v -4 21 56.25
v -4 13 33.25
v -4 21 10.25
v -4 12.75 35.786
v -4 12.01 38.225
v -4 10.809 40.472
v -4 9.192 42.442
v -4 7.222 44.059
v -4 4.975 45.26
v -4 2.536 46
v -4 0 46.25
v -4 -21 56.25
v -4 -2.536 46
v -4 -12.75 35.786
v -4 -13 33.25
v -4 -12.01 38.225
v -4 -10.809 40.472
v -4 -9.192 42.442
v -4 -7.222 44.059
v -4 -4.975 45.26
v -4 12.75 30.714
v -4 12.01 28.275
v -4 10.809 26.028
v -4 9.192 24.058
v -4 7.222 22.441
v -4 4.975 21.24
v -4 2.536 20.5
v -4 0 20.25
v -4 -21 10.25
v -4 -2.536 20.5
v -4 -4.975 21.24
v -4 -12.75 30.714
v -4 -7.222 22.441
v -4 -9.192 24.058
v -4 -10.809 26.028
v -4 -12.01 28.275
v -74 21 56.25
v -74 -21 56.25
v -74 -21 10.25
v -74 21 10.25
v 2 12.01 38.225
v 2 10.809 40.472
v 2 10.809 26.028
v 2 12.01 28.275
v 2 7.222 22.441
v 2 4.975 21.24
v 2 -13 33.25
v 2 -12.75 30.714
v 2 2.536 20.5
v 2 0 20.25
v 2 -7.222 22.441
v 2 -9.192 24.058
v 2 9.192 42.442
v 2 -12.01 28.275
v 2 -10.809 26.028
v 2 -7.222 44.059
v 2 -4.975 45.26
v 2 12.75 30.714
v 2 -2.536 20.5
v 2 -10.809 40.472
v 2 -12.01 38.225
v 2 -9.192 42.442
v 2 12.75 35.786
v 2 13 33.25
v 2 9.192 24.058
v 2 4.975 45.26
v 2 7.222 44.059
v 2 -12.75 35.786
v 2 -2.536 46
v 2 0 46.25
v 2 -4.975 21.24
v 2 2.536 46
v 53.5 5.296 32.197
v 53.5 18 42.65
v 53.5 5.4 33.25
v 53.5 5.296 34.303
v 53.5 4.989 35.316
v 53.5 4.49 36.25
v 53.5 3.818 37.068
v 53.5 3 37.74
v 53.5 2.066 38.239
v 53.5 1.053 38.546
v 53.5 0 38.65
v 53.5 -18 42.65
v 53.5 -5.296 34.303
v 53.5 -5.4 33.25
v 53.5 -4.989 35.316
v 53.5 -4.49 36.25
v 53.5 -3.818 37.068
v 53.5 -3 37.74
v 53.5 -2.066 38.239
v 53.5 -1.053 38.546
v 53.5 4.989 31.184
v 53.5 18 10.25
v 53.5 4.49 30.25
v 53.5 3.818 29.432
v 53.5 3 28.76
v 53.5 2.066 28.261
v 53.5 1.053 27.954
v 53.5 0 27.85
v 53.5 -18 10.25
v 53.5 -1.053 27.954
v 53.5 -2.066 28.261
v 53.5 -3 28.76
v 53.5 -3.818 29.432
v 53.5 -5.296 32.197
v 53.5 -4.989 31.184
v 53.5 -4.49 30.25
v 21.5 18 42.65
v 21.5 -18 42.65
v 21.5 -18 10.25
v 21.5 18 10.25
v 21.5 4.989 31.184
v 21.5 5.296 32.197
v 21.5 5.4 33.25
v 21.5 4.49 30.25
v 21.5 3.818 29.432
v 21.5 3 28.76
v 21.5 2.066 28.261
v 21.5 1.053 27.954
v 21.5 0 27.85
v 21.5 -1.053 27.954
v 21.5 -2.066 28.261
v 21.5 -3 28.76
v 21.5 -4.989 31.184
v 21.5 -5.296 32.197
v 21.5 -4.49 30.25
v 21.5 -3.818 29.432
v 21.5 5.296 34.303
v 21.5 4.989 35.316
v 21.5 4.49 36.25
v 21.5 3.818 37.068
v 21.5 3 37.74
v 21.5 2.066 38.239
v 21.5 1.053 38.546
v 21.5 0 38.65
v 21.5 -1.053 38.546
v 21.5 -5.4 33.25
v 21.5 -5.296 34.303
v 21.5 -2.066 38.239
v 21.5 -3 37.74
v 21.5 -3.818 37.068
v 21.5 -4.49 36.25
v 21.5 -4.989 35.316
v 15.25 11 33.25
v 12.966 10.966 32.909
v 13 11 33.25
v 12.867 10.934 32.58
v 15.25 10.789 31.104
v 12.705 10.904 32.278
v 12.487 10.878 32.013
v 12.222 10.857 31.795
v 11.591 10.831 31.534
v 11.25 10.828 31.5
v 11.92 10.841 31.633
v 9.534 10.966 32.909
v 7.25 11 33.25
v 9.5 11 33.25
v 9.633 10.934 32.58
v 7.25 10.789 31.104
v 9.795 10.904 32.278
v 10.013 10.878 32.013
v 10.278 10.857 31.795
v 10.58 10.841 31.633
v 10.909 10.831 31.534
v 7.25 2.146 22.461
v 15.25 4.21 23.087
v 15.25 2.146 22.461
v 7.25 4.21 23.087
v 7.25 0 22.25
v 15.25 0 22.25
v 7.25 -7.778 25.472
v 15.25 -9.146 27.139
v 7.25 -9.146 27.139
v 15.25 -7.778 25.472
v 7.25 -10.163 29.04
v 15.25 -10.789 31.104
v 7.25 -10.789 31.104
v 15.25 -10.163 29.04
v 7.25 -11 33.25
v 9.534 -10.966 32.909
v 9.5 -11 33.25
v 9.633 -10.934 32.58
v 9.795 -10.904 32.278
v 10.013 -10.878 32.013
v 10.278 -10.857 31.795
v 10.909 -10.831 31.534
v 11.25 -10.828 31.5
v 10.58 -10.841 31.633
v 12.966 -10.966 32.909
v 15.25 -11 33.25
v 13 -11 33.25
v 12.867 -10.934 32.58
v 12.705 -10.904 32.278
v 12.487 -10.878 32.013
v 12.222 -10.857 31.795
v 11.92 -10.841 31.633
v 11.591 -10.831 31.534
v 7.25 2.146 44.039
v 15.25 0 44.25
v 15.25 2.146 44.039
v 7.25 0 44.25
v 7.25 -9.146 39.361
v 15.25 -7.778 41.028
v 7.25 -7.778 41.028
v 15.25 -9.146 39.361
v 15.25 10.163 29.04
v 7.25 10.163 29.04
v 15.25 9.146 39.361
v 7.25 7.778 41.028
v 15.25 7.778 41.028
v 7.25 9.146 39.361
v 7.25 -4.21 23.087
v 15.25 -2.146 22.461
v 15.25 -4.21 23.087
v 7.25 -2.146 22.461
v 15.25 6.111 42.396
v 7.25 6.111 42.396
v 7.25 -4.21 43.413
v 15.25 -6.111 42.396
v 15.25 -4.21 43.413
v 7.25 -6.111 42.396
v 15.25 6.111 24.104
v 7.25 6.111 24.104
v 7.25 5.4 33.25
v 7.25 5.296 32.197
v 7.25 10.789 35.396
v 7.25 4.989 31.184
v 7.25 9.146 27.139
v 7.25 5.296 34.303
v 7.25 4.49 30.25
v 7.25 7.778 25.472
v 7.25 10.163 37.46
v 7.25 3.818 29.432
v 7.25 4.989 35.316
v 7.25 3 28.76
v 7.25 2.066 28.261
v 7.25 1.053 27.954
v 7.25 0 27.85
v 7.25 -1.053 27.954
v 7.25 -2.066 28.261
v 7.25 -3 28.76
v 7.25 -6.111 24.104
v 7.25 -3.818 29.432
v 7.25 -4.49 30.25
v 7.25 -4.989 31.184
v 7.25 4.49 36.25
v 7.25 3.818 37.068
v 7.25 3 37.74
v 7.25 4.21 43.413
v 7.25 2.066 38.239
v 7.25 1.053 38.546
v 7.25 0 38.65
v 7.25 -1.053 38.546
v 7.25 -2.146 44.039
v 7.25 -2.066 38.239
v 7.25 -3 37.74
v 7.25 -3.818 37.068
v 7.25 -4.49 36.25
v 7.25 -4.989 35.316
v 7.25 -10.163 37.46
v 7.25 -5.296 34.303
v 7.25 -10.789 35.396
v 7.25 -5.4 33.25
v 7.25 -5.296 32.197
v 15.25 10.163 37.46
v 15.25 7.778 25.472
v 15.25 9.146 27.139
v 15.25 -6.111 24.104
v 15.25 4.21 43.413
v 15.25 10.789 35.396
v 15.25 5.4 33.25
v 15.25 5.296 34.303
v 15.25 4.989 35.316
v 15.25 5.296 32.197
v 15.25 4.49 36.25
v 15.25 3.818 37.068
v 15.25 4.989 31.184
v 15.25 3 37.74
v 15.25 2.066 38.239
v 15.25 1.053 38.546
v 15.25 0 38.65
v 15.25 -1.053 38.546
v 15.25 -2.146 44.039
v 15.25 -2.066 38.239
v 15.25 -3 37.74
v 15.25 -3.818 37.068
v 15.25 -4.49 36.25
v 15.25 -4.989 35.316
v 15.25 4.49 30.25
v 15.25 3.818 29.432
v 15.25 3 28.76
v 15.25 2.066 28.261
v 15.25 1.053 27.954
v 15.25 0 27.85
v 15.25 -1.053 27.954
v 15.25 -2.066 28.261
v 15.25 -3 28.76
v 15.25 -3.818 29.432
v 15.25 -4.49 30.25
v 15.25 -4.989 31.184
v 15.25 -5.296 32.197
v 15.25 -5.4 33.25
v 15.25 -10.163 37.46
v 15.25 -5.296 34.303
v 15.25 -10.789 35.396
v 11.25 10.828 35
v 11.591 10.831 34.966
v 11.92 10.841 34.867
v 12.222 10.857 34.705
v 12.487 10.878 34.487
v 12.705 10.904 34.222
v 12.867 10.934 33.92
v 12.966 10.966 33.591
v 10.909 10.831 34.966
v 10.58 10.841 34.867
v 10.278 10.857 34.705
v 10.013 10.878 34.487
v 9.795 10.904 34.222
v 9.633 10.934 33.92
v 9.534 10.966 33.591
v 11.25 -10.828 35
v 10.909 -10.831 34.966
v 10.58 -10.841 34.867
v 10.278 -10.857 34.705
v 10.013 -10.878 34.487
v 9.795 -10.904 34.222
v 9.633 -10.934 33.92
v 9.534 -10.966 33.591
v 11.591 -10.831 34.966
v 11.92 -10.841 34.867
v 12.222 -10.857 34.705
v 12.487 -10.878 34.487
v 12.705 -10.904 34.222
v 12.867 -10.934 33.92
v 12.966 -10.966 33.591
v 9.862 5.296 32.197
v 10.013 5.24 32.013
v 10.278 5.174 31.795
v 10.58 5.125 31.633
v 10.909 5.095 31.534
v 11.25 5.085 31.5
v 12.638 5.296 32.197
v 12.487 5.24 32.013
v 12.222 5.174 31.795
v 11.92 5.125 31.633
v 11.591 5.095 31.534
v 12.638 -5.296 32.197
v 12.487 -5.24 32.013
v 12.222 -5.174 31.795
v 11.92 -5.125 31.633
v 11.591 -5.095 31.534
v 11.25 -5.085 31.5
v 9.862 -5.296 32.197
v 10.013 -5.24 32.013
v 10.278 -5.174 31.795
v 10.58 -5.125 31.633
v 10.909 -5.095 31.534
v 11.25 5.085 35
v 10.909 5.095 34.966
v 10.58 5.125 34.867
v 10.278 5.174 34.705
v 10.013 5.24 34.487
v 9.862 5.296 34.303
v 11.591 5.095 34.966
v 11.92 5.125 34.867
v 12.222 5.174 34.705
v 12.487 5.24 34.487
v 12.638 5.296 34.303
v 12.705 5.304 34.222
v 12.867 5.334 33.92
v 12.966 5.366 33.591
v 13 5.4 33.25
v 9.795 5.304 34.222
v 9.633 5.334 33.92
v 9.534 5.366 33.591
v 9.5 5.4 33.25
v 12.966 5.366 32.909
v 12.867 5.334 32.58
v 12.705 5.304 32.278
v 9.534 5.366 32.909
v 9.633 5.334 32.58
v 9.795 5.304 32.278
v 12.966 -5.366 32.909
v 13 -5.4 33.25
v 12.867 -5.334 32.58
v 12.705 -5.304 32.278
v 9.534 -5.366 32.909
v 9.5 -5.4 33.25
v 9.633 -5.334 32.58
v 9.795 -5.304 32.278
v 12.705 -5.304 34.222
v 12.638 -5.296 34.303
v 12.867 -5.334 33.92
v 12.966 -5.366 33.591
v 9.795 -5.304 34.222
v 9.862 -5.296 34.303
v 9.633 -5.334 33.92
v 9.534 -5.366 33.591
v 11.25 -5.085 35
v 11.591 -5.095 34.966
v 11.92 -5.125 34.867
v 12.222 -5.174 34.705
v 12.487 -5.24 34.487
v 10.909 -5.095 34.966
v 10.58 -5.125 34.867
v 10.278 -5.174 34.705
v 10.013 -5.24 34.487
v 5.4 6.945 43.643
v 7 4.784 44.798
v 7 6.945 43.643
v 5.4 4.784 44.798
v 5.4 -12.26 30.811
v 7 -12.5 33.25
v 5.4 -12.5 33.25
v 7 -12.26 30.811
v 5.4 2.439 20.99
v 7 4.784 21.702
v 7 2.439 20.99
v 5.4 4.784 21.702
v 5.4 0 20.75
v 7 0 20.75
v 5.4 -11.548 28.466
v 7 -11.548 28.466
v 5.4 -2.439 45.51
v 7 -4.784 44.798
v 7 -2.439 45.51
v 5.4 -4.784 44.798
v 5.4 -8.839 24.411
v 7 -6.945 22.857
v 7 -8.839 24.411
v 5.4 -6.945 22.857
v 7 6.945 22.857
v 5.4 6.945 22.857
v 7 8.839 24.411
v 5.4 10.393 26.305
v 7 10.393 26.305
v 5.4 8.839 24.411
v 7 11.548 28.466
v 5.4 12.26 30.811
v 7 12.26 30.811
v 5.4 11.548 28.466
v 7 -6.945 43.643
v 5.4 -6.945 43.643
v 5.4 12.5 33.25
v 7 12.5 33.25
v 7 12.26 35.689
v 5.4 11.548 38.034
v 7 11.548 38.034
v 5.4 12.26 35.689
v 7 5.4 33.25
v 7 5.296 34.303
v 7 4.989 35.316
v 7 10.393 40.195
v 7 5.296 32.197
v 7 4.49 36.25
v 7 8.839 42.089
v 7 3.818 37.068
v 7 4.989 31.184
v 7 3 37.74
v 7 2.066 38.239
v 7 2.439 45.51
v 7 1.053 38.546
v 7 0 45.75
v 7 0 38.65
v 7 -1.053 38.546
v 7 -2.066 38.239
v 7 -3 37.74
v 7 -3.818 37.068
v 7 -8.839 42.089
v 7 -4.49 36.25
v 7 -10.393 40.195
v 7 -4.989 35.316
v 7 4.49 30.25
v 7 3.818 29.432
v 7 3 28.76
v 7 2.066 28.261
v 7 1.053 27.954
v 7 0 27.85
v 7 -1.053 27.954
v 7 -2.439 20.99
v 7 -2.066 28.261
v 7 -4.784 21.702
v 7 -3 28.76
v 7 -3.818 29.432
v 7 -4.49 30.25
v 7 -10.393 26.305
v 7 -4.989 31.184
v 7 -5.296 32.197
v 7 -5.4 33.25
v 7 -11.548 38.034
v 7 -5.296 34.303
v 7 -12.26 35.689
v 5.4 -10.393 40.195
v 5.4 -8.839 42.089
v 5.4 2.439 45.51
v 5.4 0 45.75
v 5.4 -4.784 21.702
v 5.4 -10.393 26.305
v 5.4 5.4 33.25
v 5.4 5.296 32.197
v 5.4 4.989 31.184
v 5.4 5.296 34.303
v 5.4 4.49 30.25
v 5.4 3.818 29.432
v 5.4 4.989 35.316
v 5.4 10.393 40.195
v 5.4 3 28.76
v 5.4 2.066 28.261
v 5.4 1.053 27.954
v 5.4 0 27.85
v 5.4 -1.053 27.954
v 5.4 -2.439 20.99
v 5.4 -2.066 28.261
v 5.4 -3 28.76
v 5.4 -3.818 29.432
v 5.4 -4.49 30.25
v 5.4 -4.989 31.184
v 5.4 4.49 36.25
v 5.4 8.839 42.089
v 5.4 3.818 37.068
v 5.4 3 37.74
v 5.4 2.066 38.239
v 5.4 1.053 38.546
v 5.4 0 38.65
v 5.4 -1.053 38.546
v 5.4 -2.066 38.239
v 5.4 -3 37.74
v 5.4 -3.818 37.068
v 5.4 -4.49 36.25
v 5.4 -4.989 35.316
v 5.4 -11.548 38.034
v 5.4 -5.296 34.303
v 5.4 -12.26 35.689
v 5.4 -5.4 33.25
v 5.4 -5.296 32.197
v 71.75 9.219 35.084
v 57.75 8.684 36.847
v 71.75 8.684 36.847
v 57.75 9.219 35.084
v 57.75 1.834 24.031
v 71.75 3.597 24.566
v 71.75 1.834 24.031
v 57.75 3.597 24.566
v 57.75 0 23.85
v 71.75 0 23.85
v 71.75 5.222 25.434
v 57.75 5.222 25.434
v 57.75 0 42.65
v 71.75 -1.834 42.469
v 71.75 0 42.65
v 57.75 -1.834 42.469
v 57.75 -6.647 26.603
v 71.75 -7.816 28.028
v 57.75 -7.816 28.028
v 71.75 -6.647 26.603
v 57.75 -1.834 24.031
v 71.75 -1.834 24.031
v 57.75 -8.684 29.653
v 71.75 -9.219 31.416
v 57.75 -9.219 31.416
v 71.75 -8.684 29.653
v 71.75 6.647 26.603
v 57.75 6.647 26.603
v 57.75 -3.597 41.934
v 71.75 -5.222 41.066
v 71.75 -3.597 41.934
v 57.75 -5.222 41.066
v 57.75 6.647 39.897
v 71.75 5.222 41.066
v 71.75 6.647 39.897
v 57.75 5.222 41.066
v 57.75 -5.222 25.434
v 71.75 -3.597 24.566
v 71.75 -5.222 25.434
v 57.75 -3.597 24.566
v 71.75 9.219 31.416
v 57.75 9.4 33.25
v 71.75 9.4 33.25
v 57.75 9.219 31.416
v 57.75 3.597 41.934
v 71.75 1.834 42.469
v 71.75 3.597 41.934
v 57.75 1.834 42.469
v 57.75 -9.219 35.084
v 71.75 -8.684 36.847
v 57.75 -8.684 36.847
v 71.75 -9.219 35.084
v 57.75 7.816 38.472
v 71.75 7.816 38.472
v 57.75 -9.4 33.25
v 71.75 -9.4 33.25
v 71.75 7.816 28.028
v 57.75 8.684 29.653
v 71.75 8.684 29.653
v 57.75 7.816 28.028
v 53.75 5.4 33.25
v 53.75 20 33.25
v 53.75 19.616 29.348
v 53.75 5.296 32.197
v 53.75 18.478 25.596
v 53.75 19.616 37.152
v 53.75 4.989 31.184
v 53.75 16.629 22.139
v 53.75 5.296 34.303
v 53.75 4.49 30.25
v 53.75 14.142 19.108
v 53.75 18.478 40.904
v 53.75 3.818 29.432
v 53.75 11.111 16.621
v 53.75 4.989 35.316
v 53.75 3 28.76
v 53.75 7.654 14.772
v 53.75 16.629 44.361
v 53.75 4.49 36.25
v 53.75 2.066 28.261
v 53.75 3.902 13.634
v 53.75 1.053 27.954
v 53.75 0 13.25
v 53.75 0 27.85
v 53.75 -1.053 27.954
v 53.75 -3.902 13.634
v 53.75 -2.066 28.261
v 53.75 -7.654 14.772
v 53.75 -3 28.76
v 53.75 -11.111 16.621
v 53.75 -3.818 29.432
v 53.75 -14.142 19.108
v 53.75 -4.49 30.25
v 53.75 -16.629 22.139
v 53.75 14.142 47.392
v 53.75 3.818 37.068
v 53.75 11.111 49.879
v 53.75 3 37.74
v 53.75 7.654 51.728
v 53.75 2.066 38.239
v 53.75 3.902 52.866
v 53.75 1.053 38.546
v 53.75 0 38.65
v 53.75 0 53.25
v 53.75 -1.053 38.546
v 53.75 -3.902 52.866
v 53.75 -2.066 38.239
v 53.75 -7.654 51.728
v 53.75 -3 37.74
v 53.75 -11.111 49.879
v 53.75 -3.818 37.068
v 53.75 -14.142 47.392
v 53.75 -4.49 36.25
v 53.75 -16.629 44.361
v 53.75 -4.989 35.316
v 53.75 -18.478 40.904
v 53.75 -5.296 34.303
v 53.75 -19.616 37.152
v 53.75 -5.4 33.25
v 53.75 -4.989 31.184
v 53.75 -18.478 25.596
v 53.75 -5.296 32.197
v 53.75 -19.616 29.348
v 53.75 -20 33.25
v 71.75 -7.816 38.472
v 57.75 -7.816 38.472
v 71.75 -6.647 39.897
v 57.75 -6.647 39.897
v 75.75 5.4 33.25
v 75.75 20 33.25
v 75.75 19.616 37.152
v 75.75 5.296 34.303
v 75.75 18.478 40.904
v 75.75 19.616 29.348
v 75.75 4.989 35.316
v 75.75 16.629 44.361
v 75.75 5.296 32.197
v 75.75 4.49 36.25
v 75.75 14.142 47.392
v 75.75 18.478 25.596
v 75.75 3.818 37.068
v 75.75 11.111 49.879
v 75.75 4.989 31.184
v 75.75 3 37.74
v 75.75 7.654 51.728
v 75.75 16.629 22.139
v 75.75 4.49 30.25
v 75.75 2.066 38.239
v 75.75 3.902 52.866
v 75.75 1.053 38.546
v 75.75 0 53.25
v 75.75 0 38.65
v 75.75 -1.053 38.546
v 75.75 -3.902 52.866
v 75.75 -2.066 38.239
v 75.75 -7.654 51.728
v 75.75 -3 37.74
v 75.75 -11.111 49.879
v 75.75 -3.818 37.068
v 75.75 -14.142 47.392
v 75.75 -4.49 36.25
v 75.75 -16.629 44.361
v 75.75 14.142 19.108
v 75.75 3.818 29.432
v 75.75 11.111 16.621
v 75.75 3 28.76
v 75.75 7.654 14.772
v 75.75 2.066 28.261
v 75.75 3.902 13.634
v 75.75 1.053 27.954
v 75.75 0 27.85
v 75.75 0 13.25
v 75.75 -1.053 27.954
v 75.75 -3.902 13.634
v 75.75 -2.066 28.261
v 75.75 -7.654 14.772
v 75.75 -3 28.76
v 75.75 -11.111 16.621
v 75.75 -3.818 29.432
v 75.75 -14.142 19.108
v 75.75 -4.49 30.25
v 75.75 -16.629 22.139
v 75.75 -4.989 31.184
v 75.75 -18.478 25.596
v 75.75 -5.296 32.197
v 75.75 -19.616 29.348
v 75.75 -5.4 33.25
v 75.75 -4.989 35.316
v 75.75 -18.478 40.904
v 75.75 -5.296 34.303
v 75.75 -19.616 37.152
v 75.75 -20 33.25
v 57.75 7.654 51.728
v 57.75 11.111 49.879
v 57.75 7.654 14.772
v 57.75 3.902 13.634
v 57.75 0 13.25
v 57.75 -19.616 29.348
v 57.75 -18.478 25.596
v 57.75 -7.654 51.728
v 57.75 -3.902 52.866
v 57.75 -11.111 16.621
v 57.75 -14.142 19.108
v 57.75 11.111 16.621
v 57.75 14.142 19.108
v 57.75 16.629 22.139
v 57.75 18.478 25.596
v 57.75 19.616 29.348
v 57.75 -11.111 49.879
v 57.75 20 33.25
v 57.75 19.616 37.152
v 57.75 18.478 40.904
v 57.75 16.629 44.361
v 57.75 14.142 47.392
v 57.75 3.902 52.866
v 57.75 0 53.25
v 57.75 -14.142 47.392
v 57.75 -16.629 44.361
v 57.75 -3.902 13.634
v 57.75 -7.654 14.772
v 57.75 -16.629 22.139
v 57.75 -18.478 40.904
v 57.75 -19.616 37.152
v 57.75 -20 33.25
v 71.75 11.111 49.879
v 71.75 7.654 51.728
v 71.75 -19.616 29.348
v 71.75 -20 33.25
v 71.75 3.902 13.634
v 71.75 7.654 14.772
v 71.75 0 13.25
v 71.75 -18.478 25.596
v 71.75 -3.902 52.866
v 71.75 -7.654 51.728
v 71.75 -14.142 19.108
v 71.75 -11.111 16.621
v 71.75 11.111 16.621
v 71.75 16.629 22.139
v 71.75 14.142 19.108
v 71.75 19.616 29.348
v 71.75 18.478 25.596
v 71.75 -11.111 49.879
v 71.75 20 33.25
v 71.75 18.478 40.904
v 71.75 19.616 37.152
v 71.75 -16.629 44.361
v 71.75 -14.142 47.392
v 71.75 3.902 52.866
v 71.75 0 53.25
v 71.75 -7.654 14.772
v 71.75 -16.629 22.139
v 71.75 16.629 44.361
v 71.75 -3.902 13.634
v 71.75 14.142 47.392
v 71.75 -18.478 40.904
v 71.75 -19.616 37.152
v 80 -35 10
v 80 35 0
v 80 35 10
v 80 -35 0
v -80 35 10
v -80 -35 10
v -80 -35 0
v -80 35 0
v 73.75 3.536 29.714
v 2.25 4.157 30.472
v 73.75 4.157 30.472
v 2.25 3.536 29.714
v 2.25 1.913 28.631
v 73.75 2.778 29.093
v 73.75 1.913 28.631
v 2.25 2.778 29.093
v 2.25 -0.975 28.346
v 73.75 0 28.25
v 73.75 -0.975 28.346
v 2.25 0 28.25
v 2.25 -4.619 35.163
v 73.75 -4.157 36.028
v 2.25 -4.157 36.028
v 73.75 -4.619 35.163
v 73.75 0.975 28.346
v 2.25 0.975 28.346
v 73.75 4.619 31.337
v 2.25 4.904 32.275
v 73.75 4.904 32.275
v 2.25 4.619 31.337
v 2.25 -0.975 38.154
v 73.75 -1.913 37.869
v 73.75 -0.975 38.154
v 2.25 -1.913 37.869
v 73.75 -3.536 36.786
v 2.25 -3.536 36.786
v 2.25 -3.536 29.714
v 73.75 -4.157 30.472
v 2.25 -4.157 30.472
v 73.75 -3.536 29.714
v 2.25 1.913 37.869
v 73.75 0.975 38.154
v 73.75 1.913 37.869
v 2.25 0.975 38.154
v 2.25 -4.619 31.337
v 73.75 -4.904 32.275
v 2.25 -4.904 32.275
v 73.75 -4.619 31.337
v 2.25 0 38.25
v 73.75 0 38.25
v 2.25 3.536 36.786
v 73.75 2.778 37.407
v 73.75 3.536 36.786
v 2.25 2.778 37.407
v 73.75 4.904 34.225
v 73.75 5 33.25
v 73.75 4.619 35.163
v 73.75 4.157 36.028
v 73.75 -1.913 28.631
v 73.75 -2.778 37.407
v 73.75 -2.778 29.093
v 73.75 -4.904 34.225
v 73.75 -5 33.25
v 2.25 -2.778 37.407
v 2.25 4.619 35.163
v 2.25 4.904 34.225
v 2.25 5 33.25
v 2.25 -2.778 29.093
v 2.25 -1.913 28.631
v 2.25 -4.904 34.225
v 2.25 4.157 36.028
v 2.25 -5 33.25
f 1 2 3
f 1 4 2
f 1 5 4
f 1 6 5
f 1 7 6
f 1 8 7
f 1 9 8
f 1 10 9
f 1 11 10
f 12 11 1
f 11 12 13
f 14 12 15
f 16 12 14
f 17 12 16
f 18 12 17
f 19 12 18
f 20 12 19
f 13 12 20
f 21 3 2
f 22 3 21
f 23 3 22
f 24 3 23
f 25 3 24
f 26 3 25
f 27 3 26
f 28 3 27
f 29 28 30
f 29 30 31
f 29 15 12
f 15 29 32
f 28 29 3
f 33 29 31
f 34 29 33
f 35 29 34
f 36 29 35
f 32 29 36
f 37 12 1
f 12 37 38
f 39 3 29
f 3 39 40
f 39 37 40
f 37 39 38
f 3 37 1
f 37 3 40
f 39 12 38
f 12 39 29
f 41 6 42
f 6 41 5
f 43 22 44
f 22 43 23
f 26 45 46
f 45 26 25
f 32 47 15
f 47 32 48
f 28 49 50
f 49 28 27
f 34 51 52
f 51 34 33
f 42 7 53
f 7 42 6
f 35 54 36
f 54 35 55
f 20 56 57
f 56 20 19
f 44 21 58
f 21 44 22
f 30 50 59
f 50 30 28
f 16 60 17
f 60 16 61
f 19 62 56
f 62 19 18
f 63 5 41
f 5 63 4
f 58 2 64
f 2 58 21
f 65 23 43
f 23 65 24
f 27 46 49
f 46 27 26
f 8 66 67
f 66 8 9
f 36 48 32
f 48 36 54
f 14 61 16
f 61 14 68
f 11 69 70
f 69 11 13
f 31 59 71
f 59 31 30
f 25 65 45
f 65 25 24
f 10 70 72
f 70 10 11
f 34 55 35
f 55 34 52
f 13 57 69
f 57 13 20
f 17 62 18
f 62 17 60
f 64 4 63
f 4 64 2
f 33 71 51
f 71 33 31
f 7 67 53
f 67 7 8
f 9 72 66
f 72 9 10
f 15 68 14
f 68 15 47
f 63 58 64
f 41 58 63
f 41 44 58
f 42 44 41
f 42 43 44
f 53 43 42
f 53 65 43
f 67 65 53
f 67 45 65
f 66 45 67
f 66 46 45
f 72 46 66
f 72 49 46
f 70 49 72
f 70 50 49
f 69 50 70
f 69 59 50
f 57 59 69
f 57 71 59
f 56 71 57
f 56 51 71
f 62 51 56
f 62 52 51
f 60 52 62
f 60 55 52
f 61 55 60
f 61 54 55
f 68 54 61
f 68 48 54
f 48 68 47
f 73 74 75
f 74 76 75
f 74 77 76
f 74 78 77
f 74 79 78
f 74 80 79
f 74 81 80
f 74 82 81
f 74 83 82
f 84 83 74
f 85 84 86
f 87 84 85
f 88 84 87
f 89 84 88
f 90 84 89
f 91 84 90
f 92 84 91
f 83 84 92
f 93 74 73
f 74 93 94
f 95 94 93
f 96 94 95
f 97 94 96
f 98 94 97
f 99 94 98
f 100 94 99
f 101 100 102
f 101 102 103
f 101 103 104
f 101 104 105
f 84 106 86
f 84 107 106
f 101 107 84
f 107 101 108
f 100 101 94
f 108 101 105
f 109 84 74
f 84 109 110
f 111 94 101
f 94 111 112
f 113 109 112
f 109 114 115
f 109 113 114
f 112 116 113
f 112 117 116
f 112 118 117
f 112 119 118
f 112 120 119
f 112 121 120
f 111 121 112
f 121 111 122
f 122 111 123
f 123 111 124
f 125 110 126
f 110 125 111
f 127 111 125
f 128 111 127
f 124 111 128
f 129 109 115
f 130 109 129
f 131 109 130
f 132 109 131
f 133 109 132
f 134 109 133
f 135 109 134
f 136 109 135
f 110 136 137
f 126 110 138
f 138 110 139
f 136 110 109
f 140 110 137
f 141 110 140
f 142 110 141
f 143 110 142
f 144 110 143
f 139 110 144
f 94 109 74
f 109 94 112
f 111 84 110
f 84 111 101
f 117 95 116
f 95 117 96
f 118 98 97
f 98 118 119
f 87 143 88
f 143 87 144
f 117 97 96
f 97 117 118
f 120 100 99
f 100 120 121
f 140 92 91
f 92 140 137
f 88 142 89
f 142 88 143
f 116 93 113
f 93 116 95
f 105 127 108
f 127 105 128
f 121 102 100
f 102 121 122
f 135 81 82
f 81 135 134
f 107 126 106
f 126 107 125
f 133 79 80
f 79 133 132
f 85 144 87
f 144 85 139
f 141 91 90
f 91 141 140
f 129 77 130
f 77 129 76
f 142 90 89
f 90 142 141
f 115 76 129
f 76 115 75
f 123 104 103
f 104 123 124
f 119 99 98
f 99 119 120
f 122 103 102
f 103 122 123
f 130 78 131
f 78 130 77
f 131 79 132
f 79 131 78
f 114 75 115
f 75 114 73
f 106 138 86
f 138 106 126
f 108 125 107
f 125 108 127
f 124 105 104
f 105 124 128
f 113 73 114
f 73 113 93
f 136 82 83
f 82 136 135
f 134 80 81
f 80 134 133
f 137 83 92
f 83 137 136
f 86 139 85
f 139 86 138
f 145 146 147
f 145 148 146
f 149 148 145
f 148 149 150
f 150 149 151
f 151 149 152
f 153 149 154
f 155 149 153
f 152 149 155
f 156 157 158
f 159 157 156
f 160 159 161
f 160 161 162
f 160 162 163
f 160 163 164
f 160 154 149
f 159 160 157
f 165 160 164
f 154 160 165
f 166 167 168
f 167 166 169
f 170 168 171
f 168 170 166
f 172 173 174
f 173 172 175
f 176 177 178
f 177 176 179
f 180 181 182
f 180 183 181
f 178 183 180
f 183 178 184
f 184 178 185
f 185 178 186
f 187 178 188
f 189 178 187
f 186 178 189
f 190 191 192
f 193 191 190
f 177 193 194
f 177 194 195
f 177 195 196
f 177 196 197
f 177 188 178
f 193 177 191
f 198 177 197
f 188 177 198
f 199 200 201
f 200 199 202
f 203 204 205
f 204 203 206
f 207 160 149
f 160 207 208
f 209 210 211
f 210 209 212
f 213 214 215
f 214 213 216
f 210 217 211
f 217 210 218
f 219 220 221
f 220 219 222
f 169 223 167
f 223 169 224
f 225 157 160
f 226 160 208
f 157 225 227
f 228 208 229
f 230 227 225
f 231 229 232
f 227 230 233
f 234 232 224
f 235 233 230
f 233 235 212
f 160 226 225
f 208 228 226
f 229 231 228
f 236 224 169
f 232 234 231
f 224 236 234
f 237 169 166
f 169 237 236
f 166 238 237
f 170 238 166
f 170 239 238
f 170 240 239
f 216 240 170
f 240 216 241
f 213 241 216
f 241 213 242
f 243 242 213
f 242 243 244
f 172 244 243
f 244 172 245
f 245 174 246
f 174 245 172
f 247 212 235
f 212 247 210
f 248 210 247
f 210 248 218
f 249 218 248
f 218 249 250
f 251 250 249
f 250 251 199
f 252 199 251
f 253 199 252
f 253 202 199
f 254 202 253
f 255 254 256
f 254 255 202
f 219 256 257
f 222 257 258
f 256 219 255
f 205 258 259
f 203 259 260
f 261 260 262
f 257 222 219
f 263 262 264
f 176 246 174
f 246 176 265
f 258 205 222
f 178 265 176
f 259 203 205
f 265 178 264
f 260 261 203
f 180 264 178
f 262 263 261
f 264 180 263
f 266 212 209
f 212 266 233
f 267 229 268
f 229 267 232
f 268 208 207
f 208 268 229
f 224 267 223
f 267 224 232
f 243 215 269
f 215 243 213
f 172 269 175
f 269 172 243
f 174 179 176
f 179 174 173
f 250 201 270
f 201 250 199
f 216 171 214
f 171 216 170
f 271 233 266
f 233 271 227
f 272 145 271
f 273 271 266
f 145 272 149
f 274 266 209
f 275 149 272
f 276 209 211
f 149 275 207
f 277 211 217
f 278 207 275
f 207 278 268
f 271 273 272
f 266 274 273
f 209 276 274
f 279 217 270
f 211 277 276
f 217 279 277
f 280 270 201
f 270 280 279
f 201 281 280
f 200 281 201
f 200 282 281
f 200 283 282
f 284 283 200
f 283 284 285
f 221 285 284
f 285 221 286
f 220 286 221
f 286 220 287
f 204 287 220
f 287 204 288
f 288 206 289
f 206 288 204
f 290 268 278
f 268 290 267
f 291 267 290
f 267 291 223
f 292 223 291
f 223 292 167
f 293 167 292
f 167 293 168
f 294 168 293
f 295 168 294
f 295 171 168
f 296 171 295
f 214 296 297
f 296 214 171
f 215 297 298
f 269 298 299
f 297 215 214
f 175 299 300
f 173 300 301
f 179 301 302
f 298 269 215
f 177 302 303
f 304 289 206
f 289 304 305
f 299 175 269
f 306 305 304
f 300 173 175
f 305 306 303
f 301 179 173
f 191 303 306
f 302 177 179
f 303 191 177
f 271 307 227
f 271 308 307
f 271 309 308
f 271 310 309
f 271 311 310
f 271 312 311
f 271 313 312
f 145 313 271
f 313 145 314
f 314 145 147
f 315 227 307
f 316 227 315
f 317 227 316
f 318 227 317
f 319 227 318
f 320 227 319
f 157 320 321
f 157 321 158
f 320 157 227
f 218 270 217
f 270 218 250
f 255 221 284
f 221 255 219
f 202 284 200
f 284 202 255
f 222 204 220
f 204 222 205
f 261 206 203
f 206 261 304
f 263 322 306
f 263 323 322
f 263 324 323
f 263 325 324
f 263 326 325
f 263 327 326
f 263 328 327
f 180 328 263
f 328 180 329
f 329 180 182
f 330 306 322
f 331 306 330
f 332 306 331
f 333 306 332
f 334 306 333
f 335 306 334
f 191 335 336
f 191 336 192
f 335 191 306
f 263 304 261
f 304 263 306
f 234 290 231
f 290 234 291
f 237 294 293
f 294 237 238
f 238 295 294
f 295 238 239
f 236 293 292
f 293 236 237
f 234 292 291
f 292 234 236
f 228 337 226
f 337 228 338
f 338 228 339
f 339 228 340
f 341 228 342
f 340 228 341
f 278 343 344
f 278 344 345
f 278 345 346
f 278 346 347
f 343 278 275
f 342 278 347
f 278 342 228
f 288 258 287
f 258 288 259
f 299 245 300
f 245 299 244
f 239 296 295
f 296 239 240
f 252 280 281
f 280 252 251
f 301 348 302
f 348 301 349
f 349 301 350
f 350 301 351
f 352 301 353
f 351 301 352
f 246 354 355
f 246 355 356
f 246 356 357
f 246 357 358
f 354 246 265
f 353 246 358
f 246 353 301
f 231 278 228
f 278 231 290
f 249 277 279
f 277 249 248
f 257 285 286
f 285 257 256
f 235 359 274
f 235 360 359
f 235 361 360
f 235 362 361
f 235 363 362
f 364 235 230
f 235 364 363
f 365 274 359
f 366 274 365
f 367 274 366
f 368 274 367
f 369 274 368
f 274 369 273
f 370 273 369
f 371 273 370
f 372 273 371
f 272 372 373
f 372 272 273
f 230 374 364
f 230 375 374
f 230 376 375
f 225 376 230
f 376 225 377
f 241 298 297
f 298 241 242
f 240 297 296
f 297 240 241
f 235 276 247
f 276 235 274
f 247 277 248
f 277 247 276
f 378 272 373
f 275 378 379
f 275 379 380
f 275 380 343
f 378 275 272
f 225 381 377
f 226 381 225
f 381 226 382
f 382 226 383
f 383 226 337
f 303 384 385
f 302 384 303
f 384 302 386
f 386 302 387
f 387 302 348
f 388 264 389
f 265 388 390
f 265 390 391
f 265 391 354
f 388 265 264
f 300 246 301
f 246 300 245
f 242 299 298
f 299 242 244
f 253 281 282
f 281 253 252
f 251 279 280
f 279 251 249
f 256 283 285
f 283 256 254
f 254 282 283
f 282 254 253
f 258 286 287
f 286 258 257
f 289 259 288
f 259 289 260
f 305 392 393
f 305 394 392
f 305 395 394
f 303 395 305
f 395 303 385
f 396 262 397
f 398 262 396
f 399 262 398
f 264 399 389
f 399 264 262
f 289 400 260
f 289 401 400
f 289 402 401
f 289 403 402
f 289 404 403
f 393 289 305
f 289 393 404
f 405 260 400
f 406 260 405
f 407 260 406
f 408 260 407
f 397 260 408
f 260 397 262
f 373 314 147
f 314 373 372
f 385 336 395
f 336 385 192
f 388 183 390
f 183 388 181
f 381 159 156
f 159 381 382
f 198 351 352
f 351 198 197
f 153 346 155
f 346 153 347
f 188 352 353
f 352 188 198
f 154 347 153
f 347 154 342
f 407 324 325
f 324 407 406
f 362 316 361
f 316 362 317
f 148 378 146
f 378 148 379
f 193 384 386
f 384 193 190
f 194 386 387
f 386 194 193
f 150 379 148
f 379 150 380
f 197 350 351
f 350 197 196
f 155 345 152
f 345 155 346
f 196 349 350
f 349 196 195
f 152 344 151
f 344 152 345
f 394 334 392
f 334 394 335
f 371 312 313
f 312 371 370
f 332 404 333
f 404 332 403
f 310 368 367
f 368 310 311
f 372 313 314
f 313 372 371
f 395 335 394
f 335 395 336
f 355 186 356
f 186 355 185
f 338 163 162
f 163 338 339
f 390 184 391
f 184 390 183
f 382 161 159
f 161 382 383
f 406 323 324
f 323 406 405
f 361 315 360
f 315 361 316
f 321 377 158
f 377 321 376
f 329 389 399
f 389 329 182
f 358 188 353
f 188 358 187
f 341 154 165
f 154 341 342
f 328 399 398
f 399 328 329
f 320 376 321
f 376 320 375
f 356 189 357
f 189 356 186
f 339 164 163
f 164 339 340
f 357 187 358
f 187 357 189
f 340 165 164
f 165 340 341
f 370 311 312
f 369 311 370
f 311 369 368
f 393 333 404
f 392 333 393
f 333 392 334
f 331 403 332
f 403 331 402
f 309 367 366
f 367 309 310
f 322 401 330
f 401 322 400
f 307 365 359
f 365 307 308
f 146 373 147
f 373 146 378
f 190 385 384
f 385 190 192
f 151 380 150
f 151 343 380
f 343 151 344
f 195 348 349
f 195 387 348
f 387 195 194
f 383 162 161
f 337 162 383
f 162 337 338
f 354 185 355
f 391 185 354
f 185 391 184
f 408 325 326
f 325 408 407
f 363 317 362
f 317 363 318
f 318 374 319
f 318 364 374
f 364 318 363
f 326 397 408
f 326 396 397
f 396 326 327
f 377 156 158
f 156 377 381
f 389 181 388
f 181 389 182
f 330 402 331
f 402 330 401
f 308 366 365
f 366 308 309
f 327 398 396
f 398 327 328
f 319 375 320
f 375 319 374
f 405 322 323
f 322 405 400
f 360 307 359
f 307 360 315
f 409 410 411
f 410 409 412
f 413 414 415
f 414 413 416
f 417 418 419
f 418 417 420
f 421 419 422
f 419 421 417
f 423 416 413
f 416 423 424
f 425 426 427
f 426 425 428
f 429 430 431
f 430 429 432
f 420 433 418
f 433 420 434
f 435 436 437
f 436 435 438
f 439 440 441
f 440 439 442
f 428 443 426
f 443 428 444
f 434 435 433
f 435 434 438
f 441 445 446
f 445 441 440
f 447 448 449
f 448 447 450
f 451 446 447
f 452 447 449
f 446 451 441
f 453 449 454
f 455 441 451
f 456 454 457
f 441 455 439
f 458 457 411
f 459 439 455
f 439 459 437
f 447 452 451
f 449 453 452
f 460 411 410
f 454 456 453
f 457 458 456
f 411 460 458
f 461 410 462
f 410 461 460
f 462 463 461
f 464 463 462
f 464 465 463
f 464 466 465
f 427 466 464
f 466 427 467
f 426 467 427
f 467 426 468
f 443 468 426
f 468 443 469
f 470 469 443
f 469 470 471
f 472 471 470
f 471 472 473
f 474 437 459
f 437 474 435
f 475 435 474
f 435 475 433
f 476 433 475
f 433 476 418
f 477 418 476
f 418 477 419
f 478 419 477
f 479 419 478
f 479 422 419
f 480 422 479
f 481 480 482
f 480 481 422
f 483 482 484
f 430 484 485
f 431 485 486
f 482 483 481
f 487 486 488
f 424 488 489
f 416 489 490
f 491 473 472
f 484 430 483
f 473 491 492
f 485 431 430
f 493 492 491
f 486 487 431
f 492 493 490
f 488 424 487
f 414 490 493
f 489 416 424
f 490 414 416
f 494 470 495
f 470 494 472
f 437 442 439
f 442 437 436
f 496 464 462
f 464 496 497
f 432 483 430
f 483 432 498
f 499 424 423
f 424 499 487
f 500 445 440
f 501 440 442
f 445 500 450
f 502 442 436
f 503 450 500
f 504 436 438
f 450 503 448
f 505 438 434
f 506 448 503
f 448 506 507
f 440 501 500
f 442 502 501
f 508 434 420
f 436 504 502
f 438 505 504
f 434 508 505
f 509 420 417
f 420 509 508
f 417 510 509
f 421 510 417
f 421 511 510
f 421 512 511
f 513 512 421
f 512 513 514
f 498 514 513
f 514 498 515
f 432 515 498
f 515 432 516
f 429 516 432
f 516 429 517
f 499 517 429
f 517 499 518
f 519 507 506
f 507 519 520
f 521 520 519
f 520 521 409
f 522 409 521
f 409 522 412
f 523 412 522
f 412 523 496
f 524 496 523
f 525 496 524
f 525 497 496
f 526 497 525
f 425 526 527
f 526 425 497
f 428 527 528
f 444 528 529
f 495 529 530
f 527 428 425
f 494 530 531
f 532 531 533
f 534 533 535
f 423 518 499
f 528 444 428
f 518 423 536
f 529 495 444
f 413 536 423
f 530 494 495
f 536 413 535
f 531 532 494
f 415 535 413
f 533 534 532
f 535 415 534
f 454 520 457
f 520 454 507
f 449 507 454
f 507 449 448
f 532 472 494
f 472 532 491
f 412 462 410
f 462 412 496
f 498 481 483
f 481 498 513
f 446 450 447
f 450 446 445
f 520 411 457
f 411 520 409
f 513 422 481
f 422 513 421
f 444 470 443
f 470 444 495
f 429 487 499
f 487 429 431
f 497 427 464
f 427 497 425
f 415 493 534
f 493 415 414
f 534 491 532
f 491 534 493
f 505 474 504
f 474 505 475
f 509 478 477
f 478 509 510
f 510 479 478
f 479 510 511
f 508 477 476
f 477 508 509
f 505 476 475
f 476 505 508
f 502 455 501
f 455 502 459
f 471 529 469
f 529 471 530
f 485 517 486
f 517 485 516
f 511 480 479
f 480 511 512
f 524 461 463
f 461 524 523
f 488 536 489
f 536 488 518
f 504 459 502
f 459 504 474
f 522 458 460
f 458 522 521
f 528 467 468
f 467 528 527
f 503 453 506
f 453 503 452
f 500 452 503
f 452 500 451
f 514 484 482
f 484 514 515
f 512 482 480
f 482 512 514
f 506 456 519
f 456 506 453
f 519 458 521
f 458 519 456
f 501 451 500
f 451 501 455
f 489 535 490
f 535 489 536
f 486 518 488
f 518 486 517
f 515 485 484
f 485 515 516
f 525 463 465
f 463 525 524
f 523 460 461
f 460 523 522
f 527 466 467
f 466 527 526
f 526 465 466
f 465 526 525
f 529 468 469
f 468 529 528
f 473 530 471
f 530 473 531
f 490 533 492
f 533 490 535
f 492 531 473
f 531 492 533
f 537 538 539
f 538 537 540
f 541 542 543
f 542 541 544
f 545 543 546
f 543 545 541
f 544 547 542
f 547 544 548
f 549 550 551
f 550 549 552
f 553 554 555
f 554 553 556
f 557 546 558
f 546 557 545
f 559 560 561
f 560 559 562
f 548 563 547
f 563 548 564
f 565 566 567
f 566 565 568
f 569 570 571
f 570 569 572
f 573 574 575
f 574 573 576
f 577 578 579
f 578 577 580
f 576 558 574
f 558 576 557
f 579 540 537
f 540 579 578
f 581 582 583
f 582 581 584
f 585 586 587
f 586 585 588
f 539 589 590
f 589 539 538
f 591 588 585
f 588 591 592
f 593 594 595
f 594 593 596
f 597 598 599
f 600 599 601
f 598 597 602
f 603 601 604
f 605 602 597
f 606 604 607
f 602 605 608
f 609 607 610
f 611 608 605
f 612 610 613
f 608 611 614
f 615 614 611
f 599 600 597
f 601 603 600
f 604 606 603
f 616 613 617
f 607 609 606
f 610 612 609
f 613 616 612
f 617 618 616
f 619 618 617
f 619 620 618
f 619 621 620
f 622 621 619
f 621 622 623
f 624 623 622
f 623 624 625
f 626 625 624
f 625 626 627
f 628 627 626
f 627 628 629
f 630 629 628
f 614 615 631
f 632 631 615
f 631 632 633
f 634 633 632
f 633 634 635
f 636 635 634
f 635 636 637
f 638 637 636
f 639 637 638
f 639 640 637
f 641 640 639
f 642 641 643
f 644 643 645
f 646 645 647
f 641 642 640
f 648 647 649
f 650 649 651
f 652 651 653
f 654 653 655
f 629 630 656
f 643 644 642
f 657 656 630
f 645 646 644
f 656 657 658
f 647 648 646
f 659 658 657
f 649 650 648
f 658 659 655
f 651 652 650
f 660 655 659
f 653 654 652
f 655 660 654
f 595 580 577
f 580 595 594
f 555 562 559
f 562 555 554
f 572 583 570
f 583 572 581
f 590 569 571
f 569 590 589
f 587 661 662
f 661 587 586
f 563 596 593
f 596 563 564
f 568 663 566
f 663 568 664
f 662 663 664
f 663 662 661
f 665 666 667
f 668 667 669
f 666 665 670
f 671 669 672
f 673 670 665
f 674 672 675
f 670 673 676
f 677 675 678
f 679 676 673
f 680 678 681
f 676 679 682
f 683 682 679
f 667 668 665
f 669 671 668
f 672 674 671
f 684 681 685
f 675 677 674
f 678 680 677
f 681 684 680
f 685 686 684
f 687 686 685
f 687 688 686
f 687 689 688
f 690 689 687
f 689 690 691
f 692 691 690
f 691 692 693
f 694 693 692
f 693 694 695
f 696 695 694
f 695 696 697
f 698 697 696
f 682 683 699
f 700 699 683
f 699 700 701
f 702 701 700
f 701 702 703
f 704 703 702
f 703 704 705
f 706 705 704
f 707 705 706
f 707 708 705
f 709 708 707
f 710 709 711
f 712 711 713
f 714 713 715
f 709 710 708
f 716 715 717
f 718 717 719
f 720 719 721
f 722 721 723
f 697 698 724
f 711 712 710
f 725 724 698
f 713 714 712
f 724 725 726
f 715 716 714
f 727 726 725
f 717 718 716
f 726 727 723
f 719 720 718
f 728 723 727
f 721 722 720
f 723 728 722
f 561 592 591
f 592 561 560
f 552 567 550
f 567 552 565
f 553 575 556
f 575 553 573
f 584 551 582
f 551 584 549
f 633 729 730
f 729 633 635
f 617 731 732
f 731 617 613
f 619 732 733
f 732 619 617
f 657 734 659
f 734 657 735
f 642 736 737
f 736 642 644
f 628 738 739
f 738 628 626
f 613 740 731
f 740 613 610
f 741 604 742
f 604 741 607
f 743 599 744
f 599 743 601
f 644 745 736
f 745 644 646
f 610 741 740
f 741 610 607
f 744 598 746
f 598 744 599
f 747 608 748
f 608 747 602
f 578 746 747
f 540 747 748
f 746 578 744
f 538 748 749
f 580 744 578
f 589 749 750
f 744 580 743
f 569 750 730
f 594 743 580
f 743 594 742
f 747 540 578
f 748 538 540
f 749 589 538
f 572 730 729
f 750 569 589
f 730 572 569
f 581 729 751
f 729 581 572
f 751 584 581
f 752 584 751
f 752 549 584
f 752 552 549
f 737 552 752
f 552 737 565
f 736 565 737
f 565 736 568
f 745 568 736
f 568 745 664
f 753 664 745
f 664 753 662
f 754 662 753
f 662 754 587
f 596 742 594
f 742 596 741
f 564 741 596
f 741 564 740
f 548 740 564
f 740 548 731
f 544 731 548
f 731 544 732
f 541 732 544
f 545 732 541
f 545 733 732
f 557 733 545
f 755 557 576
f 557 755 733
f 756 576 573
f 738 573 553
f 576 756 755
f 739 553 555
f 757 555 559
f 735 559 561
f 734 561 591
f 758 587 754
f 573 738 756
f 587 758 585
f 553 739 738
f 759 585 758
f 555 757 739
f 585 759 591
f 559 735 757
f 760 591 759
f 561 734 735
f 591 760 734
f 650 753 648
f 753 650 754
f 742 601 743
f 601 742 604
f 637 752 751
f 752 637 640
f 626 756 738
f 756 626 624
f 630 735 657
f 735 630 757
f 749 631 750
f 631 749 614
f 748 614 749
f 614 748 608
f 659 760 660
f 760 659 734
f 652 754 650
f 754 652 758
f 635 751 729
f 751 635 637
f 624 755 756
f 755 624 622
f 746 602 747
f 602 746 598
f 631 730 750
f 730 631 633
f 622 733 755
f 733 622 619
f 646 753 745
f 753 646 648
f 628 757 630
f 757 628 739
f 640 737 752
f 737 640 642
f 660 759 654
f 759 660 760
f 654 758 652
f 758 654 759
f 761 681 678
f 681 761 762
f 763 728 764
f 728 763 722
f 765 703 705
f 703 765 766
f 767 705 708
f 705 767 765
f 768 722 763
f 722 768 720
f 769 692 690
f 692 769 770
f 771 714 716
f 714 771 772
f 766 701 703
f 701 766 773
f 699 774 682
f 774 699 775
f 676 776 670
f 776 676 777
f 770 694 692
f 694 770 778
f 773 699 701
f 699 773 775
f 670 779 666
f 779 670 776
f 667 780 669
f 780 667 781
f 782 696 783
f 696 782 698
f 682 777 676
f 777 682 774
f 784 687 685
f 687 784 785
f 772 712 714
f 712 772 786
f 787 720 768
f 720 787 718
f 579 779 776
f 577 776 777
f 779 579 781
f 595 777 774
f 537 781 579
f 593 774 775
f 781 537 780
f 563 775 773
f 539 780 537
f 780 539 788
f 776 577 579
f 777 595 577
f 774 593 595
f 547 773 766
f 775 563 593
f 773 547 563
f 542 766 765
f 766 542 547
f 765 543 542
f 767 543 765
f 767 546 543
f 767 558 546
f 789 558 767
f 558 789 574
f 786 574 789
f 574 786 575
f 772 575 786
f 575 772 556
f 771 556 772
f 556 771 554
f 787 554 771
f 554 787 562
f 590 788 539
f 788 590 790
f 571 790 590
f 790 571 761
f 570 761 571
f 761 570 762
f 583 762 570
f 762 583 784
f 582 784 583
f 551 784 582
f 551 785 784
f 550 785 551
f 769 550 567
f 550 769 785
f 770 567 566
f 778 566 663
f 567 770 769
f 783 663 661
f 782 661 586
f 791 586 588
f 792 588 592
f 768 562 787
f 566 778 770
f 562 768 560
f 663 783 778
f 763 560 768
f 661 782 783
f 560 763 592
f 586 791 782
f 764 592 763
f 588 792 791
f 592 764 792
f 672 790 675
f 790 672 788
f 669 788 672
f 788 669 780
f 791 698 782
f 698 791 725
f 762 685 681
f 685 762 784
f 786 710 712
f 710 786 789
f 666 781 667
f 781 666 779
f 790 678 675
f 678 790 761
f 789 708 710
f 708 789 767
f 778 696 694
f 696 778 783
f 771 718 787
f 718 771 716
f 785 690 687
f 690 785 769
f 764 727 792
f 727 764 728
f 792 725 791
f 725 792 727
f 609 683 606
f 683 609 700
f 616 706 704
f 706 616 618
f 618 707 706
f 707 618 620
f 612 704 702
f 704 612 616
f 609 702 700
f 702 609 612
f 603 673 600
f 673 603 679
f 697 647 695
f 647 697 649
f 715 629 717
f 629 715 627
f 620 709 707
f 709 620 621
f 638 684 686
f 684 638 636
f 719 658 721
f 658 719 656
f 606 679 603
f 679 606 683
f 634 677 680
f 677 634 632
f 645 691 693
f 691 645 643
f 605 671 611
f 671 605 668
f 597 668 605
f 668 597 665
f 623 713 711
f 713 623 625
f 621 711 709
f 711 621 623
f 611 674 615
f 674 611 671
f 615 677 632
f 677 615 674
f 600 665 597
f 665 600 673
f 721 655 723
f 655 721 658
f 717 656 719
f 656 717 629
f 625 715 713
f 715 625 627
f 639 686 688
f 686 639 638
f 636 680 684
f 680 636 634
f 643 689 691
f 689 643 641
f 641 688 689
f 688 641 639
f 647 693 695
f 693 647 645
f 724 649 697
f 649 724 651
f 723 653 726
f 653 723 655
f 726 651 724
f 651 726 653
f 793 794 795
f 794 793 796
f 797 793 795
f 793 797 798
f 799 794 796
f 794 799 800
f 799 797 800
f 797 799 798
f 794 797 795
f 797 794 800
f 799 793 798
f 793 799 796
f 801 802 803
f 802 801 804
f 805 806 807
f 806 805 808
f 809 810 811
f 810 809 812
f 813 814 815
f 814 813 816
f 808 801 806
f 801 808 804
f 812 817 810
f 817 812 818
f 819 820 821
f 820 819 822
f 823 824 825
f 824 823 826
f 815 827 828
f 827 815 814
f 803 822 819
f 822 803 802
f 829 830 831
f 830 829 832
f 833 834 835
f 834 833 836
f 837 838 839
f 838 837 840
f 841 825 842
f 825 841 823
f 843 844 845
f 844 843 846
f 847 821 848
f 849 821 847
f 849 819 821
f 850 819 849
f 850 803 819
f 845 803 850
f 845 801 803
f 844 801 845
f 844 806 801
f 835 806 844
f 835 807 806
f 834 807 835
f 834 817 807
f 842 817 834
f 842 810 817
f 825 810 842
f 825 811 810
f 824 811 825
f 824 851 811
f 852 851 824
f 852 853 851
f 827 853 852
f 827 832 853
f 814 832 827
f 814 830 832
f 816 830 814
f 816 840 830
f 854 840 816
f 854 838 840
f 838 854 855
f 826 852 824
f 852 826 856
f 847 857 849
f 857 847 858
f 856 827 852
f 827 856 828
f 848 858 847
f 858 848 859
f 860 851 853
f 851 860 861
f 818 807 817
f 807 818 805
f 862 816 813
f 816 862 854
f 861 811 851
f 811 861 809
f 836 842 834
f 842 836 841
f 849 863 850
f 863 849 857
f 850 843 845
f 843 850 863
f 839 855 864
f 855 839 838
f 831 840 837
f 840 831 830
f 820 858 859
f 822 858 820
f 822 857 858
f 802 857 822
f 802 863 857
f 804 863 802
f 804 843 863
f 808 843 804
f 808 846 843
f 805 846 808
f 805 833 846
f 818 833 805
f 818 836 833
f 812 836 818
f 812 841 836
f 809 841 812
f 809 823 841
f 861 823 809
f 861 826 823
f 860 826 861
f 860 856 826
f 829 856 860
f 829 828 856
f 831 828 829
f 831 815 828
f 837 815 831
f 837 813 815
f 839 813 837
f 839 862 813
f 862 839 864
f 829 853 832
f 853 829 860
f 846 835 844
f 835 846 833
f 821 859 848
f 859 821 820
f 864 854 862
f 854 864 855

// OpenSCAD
$fn = 32;

// ------------------------------------------------------------------------
// Motor drive station: motor 70 x 46 mm, shaft d10, pulley d40
// Every part is its own module, assembly() places every instance.
// ------------------------------------------------------------------------

// --- part 1 ---
module station_bed() {
  difference() {
    translate([-80, -35, 0]) cube([160, 70, 10]);
  }
}

// --- part 2 ---
module drive_motor() {
  union() {
    translate([-35, -21, 0]) cube([70, 42, 46]);
    translate([38, 0, 23]) rotate([0, 90, 0]) cylinder(h = 6, d = 26, center = true);
  }
}

// --- part 3 ---
module pillow_block() {
  difference() {
    translate([-16, -18, 0]) cube([32, 36, 32.4]);
    translate([0, 0, 23]) rotate([0, 90, 0]) cylinder(h = 34, d = 10.8, center = true);
  }
}

// --- part 4 ---
module drive_shaft() {
  translate([0, 0, -35.75]) cylinder(h = 71.5, d = 10);
}

// --- part 5 ---
module shaft_collar() {
  difference() {
    cylinder(h = 8, d = 22);
    translate([0, 0, -1]) cylinder(h = 10, d = 10.8);
    translate([0, 0, 4]) rotate([90, 0, 0]) cylinder(h = 24, d = 3.5, center = true);
  }
}

// --- part 6 ---
module collar_washer() {
  difference() {
      translate([0, 0, 0]) cylinder(h = 1.6, d = 25);
      translate([0, 0, -1]) cylinder(h = 3.6, d = 10.8);
    }
}

// --- part 7 ---
module drive_pulley() {
  difference() {
    union() {
      cylinder(h = 22, d = 18.8);
      cylinder(h = 4, d = 40);
      translate([0, 0, 18]) cylinder(h = 4, d = 40);
    }
    translate([0, 0, -1]) cylinder(h = 24, d = 10.8);
  }
}

// --- assembly ---
module assembly() {
  color([0.80, 0.24, 0.20]) translate([0, 0, 0]) rotate([0, 0, 0]) station_bed();
  color([0.20, 0.45, 0.75]) translate([-39, 0, 10.25]) rotate([0, 0, 0]) drive_motor();
  color([0.25, 0.62, 0.32]) translate([37.5, 0, 10.25]) rotate([0, 0, 0]) pillow_block();
  color([0.92, 0.70, 0.18]) translate([38, 0, 33.25]) rotate([0, 90, 0]) drive_shaft();
  color([0.58, 0.35, 0.70]) translate([7.25, 0, 33.25]) rotate([0, 90, 0]) shaft_collar();
  color([0.16, 0.66, 0.66]) translate([5.4, 0, 33.25]) rotate([0, 90, 0]) collar_washer();
  color([0.85, 0.48, 0.18]) translate([53.75, 0, 33.25]) rotate([0, 90, 0]) drive_pulley();
}

assembly();
